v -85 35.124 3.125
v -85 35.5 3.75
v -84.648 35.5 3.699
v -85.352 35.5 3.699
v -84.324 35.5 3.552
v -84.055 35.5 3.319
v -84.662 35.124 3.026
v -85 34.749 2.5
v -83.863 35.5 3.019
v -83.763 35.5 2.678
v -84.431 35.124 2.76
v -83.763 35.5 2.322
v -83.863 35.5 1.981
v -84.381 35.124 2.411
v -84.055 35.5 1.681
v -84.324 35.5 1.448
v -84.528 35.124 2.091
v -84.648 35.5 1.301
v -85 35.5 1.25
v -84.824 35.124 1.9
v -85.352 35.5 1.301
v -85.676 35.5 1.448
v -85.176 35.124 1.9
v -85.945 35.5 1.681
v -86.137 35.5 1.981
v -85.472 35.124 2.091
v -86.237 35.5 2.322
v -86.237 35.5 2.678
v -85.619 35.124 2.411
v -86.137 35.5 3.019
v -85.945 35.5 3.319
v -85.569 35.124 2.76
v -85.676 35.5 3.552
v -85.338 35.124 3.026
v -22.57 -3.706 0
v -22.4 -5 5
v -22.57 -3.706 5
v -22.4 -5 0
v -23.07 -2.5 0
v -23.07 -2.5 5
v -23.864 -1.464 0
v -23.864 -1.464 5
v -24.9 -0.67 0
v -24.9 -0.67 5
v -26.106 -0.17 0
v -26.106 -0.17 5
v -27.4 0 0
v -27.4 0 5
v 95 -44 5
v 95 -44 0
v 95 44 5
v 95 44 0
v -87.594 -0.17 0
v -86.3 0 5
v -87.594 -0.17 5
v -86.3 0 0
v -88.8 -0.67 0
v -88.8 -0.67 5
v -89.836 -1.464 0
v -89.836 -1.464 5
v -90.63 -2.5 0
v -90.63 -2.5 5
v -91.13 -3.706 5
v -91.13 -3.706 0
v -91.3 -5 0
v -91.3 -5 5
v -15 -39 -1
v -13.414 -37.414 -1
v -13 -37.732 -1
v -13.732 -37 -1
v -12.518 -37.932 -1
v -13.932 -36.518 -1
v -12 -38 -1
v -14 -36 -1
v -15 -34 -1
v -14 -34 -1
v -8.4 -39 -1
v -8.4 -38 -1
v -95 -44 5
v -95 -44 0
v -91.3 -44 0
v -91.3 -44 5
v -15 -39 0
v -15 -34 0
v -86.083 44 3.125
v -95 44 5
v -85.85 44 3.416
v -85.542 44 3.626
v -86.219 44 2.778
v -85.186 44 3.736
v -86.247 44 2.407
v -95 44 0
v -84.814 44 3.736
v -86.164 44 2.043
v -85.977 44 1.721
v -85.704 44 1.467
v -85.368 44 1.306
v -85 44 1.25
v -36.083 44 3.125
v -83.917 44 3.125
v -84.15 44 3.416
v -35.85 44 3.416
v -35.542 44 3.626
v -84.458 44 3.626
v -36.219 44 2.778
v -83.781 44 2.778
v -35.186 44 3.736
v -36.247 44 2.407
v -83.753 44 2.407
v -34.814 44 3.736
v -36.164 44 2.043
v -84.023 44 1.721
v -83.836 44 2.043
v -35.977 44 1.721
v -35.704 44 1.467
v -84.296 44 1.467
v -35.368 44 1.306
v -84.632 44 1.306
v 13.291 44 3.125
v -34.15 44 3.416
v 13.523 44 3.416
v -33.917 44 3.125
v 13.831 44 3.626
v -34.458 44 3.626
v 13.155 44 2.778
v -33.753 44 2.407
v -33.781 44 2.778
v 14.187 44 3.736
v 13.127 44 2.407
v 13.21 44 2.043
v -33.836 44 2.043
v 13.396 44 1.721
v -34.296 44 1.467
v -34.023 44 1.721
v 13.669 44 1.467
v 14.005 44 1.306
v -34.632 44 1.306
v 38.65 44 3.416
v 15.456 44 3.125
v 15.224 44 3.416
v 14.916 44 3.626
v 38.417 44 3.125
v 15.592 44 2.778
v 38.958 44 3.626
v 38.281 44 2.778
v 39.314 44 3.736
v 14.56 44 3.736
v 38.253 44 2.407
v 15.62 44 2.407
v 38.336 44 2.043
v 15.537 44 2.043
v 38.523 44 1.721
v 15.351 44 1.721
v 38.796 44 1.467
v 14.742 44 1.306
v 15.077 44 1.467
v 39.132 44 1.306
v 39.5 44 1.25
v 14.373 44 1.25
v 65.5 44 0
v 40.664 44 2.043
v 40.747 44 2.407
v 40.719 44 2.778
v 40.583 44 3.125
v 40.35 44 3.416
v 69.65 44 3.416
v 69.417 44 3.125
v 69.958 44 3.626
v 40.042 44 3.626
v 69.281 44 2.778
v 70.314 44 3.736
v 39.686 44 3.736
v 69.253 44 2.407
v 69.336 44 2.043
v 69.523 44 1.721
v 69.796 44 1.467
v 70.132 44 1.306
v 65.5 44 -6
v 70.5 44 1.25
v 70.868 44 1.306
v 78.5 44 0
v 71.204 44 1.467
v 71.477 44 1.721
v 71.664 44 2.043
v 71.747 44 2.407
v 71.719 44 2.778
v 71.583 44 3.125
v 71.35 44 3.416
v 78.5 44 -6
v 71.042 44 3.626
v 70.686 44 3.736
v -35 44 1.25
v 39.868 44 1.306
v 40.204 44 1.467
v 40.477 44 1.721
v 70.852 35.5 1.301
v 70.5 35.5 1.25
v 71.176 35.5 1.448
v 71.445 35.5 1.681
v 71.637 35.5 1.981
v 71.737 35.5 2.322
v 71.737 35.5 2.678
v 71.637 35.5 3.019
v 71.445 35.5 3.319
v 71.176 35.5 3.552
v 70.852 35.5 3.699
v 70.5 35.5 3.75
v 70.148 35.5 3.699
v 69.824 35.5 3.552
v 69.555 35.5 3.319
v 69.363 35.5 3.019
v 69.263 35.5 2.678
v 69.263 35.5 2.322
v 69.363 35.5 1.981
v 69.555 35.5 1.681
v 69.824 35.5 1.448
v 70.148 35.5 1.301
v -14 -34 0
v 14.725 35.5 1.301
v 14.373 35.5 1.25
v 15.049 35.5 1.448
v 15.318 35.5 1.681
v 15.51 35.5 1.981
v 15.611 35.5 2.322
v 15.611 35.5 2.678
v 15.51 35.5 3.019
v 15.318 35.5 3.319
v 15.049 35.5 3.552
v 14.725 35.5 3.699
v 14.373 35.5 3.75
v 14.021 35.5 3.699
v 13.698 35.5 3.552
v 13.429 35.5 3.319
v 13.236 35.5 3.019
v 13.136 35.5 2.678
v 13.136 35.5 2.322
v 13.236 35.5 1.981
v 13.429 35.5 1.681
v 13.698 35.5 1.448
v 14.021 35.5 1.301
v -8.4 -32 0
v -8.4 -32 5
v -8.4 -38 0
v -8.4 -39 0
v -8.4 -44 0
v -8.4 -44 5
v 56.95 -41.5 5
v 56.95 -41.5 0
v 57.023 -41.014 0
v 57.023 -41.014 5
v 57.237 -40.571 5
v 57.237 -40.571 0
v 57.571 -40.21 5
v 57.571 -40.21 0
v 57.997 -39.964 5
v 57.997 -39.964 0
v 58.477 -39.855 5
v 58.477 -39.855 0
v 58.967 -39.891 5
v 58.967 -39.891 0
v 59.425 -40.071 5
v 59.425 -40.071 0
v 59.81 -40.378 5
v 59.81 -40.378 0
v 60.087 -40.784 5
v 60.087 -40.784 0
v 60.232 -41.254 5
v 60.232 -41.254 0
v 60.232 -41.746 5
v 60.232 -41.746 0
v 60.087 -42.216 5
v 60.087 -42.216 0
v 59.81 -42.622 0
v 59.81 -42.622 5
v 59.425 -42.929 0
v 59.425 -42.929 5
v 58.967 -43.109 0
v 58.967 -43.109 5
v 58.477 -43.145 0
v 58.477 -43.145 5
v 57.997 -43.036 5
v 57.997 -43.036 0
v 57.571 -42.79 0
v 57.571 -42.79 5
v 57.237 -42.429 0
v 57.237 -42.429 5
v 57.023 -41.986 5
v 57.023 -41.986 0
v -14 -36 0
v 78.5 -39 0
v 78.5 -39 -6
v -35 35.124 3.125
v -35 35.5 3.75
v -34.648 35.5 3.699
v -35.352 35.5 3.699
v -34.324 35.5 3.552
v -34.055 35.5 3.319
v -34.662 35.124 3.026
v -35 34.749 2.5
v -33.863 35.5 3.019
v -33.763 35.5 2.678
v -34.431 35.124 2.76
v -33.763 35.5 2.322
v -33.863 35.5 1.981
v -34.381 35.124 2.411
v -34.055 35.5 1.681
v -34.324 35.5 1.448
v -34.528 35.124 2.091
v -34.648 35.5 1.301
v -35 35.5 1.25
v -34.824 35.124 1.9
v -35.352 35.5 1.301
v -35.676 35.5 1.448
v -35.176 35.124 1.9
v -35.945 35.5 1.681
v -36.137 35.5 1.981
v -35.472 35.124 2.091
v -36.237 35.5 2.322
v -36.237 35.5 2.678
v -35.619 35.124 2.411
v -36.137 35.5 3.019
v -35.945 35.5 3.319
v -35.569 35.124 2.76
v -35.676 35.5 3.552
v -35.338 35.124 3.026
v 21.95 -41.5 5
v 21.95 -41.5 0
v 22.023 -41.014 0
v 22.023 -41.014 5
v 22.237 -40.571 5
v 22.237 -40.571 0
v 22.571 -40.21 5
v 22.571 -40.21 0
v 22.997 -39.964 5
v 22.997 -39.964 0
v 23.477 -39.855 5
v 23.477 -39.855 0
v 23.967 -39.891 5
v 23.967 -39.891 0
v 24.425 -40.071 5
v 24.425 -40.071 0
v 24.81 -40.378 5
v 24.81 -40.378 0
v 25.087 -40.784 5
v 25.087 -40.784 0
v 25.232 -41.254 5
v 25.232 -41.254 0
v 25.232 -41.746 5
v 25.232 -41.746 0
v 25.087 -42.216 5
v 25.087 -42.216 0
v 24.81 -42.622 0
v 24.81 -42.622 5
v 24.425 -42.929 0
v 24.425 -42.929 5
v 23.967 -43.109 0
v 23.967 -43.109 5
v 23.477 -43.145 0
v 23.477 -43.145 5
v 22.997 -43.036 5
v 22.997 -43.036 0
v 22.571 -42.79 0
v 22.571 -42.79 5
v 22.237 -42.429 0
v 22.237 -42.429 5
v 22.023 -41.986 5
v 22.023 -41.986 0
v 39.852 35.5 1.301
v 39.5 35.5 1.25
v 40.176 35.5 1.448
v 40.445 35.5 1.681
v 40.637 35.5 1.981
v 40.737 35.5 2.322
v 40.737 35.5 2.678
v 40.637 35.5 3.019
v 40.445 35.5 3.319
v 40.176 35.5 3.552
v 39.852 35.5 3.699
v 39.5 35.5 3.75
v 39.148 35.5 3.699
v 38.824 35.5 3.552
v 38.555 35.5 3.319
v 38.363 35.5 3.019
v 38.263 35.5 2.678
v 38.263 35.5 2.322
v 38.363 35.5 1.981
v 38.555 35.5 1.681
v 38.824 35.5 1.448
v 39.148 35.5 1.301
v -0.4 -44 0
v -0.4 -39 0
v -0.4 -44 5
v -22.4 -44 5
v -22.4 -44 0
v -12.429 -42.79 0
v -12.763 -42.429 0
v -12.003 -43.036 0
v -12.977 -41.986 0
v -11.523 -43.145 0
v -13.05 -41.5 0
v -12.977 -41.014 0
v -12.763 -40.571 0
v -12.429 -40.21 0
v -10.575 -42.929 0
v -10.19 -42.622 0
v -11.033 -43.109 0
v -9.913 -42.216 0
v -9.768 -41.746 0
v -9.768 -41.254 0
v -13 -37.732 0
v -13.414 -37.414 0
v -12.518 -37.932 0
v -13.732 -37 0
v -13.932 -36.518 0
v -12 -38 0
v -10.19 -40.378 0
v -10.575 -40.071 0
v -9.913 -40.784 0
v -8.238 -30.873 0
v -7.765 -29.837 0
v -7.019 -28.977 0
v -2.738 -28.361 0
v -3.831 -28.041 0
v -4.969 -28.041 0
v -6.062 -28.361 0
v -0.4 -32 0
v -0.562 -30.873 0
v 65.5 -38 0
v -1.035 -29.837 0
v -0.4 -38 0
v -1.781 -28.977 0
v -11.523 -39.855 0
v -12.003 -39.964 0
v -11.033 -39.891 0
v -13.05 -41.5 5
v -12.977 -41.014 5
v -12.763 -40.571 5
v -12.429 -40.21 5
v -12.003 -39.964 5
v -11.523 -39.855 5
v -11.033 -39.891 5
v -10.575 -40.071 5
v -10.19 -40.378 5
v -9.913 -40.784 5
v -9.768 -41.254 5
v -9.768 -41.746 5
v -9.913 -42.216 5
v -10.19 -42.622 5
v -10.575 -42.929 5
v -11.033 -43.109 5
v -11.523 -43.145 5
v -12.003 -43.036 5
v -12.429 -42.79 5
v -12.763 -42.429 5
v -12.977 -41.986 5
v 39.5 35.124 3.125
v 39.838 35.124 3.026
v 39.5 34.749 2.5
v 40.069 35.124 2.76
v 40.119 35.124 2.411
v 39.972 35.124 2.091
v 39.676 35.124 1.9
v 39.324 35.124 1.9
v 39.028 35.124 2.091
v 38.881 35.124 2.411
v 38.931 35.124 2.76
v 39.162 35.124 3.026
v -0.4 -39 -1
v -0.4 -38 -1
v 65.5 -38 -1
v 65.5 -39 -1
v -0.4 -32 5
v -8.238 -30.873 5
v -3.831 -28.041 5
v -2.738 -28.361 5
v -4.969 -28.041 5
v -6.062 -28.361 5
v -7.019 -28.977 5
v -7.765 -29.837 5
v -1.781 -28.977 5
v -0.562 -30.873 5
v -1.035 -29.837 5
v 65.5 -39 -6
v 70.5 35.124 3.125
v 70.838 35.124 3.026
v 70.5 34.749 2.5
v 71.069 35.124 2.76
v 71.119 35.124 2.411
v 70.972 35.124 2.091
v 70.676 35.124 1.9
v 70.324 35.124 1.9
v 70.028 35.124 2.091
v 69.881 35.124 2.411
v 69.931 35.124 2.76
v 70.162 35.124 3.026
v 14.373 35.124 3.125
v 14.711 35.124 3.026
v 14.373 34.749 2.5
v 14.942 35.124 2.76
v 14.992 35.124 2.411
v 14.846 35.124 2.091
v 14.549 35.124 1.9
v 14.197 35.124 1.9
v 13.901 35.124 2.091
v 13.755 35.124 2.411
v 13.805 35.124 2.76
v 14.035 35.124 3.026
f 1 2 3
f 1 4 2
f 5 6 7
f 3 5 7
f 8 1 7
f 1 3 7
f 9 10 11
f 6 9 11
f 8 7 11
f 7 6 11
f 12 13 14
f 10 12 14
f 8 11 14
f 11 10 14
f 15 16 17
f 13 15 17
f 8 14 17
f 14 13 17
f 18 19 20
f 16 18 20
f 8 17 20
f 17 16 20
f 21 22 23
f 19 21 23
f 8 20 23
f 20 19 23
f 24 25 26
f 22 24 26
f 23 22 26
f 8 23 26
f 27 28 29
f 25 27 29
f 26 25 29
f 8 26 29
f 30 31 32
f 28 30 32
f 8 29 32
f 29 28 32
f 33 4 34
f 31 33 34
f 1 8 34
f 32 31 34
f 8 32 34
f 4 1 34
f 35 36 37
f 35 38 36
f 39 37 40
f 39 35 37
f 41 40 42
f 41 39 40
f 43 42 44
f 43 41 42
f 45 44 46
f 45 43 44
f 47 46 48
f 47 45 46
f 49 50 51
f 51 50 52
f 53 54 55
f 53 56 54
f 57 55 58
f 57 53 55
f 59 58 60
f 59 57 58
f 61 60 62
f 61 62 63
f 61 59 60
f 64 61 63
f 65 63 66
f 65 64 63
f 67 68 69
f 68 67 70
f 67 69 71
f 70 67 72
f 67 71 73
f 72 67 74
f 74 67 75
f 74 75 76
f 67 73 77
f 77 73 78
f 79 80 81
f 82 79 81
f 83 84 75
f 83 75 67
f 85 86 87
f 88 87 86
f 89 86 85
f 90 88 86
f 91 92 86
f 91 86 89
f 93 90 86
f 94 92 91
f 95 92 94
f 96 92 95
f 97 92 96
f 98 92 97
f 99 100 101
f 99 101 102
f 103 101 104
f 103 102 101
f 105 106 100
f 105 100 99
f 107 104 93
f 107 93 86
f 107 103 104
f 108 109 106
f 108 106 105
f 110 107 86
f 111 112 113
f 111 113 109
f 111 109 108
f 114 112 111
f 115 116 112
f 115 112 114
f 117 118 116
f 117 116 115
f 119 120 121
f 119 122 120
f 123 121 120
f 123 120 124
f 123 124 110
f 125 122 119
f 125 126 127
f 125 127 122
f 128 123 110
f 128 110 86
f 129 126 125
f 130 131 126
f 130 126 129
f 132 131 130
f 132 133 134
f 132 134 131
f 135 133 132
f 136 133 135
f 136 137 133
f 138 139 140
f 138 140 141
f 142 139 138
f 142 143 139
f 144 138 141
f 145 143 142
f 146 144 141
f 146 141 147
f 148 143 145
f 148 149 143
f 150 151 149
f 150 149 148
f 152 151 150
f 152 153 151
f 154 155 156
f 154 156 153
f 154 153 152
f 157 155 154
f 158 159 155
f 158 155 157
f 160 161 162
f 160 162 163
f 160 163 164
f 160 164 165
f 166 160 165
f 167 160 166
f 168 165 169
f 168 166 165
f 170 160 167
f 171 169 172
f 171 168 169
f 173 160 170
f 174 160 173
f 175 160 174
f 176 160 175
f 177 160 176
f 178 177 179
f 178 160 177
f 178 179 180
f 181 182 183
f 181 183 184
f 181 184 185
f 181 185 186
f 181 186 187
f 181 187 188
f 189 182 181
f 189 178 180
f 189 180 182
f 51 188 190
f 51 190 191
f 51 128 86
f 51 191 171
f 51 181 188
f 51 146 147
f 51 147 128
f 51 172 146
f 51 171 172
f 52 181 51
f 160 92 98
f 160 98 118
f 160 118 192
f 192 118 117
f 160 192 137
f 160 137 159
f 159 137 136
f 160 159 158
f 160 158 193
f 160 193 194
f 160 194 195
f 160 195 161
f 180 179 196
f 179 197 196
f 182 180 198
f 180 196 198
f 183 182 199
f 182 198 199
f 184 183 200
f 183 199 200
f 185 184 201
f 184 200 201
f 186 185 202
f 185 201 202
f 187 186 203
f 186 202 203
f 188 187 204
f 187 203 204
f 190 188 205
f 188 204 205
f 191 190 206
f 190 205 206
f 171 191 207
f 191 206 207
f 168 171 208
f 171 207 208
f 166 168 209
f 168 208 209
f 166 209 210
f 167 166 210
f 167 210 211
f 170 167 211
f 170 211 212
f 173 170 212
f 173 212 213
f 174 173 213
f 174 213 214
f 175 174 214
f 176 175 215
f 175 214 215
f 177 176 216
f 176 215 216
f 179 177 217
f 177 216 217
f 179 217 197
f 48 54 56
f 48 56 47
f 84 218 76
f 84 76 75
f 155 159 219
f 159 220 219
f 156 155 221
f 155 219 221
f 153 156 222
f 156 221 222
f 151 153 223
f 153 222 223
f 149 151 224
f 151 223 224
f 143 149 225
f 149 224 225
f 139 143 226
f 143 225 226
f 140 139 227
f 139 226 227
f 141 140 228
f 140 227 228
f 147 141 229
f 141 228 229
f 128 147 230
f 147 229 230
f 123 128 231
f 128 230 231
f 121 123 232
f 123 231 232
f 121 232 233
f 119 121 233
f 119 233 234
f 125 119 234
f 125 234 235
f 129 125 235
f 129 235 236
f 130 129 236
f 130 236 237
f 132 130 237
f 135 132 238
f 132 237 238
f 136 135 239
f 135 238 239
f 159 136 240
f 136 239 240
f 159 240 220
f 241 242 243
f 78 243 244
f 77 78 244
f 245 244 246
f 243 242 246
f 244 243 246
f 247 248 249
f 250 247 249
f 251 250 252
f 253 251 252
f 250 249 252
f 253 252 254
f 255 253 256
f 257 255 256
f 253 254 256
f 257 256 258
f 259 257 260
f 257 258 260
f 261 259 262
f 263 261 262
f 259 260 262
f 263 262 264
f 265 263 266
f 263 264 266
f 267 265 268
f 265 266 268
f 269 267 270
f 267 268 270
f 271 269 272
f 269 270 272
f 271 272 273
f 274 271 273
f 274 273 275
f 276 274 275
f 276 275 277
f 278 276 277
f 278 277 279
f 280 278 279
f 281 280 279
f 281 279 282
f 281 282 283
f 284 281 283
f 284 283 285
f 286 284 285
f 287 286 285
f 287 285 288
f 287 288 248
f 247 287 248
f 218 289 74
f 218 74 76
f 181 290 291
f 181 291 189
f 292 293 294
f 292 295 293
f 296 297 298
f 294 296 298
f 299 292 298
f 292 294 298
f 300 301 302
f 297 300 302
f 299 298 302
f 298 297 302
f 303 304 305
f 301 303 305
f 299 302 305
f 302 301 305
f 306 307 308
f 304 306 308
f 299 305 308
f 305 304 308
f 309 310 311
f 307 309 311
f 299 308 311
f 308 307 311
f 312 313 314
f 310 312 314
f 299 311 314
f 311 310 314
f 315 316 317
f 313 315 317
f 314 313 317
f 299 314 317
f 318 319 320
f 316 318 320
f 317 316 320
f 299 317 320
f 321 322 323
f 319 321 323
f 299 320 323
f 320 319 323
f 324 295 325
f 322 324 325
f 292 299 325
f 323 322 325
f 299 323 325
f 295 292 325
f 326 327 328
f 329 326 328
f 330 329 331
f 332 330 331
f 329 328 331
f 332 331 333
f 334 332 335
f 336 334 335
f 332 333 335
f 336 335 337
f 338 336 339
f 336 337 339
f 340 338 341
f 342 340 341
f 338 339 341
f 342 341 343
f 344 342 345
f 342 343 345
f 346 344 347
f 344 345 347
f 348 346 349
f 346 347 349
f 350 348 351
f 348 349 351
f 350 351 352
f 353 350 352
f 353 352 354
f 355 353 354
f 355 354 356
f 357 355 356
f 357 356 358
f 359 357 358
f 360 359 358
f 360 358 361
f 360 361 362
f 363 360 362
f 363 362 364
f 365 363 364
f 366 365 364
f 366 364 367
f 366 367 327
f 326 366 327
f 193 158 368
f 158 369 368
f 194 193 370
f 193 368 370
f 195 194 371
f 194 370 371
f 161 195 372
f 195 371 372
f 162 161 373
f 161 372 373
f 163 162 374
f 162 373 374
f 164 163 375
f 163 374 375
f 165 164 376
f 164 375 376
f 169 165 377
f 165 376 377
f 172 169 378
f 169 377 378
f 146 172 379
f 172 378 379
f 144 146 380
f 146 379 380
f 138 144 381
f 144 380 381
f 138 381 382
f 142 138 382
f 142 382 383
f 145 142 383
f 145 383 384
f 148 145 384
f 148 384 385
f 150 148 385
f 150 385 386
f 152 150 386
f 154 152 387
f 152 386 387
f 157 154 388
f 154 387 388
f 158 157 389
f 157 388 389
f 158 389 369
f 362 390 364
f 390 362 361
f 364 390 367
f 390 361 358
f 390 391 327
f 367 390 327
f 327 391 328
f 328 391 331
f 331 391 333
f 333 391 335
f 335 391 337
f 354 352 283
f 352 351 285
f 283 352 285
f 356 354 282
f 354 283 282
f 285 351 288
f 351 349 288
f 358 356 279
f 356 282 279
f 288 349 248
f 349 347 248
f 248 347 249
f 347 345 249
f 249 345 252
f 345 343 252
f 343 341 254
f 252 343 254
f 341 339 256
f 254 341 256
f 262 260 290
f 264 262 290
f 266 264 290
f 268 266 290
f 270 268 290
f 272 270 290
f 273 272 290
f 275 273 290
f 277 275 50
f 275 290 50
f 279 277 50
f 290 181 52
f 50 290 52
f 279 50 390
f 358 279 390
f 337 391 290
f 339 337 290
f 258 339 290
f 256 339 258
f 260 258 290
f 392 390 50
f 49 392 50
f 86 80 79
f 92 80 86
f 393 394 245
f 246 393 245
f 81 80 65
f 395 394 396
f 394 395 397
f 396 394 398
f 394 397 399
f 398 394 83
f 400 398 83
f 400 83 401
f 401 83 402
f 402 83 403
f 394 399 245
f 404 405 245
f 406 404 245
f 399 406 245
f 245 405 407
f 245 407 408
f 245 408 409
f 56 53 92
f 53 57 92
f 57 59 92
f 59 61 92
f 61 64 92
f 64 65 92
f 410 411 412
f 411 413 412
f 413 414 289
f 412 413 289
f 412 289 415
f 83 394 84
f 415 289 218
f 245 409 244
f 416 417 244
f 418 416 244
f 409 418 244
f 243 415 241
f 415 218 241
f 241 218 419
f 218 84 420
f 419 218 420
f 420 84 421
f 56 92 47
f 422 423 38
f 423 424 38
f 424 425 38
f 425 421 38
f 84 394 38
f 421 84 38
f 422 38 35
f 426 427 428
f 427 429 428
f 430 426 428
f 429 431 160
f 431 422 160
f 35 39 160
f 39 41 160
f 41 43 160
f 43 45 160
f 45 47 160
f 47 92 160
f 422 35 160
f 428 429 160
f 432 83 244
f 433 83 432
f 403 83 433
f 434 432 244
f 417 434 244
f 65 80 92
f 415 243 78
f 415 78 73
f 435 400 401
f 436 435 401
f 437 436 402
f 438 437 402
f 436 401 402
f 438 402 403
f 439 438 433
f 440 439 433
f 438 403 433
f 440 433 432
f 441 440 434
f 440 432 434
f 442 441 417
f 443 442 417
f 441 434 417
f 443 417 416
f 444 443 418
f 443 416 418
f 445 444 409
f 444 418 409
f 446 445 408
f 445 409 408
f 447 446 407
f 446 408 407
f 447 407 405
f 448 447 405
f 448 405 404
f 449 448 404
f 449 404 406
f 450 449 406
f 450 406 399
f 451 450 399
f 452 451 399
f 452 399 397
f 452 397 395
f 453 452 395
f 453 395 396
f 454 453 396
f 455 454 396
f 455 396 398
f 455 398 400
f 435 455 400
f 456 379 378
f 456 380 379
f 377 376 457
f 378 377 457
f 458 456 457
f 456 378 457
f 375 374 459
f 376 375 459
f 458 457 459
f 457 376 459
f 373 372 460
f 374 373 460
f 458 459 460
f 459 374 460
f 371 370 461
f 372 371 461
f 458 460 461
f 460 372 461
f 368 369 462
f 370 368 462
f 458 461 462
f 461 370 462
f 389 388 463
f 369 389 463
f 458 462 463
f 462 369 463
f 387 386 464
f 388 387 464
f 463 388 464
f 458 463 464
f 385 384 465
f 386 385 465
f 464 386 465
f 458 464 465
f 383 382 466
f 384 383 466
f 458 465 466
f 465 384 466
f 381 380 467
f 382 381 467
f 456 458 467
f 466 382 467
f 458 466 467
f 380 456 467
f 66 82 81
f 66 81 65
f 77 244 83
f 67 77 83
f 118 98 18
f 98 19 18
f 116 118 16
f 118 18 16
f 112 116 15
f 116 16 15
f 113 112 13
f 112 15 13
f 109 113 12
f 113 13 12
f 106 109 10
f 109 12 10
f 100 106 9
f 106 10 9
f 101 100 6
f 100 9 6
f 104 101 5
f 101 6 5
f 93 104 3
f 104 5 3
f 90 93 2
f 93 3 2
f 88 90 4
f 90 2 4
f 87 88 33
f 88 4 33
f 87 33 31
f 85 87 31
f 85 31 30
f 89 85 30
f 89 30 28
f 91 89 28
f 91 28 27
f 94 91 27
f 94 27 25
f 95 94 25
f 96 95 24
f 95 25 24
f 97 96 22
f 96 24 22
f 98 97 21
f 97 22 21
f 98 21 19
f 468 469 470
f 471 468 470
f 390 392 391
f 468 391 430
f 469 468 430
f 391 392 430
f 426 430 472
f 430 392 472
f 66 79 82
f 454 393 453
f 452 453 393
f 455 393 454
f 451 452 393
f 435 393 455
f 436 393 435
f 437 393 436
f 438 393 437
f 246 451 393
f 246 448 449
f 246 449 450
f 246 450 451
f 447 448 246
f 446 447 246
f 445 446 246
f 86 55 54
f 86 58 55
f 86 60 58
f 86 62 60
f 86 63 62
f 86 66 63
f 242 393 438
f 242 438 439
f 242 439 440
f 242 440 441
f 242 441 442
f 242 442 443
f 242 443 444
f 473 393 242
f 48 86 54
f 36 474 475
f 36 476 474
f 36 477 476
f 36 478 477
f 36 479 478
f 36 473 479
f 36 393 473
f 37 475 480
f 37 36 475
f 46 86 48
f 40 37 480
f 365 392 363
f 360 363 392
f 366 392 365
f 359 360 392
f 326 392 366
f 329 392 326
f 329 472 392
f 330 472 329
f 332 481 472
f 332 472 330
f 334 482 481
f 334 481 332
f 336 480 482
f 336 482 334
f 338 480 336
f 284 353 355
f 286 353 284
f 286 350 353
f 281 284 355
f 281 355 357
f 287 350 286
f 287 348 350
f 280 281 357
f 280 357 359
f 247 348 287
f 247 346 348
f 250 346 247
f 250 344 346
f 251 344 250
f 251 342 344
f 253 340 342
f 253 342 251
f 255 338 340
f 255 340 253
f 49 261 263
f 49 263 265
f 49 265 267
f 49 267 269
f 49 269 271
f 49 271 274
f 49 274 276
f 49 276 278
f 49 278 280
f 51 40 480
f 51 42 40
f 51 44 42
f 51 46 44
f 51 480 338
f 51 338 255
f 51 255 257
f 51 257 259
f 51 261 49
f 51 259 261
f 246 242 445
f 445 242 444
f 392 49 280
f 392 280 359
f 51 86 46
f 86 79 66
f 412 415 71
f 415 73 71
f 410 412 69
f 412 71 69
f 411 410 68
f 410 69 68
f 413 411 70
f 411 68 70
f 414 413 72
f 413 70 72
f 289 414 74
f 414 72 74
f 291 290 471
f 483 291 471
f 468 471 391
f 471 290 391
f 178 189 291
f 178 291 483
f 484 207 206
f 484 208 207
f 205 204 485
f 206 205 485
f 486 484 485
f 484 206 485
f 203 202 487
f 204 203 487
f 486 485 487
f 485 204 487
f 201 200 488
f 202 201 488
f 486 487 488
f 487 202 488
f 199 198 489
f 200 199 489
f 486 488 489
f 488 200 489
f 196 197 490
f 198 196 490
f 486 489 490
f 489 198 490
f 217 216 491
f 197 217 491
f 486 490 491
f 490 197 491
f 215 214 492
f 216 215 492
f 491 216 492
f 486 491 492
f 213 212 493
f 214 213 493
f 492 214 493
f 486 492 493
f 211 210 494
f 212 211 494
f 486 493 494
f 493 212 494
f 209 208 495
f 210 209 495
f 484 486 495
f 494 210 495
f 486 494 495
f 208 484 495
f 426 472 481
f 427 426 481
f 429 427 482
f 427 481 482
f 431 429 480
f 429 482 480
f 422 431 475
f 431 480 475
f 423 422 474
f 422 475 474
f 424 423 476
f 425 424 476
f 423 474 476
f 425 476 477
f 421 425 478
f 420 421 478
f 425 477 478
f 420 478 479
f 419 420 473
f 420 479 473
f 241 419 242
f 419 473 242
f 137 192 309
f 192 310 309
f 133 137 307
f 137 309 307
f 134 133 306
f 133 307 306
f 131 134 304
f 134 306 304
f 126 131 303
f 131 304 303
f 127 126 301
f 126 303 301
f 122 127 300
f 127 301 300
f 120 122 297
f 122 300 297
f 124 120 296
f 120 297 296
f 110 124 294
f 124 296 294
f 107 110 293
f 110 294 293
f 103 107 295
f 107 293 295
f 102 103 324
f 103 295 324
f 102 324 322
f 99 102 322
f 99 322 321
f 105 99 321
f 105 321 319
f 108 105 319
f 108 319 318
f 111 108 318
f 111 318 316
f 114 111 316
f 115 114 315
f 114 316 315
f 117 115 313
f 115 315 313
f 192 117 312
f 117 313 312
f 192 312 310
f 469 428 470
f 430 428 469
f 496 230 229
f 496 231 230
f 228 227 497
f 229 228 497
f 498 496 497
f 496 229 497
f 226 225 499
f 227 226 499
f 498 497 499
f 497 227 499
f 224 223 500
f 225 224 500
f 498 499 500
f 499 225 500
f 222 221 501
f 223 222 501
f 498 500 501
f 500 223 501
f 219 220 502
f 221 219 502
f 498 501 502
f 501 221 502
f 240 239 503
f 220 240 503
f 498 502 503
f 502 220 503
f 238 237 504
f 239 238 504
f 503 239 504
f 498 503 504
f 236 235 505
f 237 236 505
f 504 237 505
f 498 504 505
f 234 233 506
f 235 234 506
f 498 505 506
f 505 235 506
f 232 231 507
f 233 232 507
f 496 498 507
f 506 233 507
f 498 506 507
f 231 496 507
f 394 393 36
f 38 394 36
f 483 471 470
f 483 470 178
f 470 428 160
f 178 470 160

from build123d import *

# Parameters (mm, degrees)
SKETCH1_W              = 190
SKETCH1_H              = 88
BOSS_EXTRUDE1_DEPTH    = 5
SKETCH2_W              = 13
SKETCH2_H              = 83
BOSS_EXTRUDE2_DEPTH    = 6
BOSS_EXTRUDE3_DEPTH    = 1
SKETCH7_R              = 1.65
CUT_EXTRUDE3_DEPTH     = 6
FILLET3_R              = 2
HOLE_WIZARD_M3_1_D     = 2.5
HOLE_WIZARD_M3_1_DEPTH = 8.5
HOLE_WIZARD_M3_1_TIP   = 0.751075774
CUT_EXTRUDE_START      = -5
CUT_EXTRUDE_1_DEPTH    = 12
SKETCH_4_W             = 68.9
SKETCH_4_H             = 44
CUT_EXTRUDE_2_DEPTH    = 12
FILLET_1_R             = 5


with BuildPart() as part:
    # Sketch1 → Boss-Extrude1 (new body)
    with BuildSketch(Plane.XY):
        Rectangle(SKETCH1_W, SKETCH1_H)
    extrude(amount=BOSS_EXTRUDE1_DEPTH)

    # Sketch2 → Boss-Extrude2 (add)
    with BuildSketch(Plane(origin=(0, 0, 0), x_dir=(-1, 0, 0), z_dir=(0, 0, -1))):
        with Locations((-72, 2.5)):
            Rectangle(SKETCH2_W, SKETCH2_H)
    extrude(amount=BOSS_EXTRUDE2_DEPTH)

    # Sketch4 → Boss-Extrude3 (add)
    with BuildSketch(Plane(origin=(0, 0, 0), x_dir=(-1, 0, 0), z_dir=(0, 0, -1))):
        Polygon((-65.5, -38), (14, -38), (14, -34), (15, -34), (15, -39), (-65.5, -39), align=None)
    extrude(amount=BOSS_EXTRUDE3_DEPTH)

    # Sketch7 → Cut-Extrude3 (cut, through all)
    with BuildSketch(Plane(origin=(0, 0, 0), x_dir=(-1, 0, 0), z_dir=(0, 0, -1))):
        with Locations((-58.6, -41.5)):
            Circle(SKETCH7_R)
        with Locations((-23.6, -41.5)):
            Circle(SKETCH7_R)
        with Locations((11.4, -41.5)):
            Circle(SKETCH7_R)
    extrude(amount=-CUT_EXTRUDE3_DEPTH, mode=Mode.SUBTRACT)

    # Fillet3
    fillet3_edges = [part.edges().sort_by_distance(p)[0] for p in [
        (-14, -38, -0.5),
    ]]
    fillet(fillet3_edges, radius=FILLET3_R)

    # M3 螺纹孔1
    with Locations(Plane(origin=(-85, 44, 2.5), x_dir=(0, 0, 1), z_dir=(0, 1, 0))):
        with Locations((0, 0), (0, 50), (0, 99.373308098), (0, 124.5), (0, 155.5)):
            Hole(HOLE_WIZARD_M3_1_D / 2, depth=HOLE_WIZARD_M3_1_DEPTH)
            with Locations((0, 0, -(HOLE_WIZARD_M3_1_DEPTH + HOLE_WIZARD_M3_1_TIP / 2))):  # 118° drill point
                Cone(0, HOLE_WIZARD_M3_1_D / 2, HOLE_WIZARD_M3_1_TIP, mode=Mode.SUBTRACT)

    # 草图3 → 切除-拉伸1 (cut, through all)
    with BuildSketch(Plane(origin=(0, 0, 0), x_dir=(-1, 0, 0), z_dir=(0, 0, -1)).offset(CUT_EXTRUDE_START)):
        with BuildLine():
            Line((0.4, -44), (0.4, -32))
            ThreePointArc((0.4, -32), (4.4, -28), (8.4, -32))
            Line((8.4, -32), (8.4, -44))
            Line((8.4, -44), (0.4, -44))
        make_face()
    extrude(amount=CUT_EXTRUDE_1_DEPTH, mode=Mode.SUBTRACT)

    # 草图4 → 切除-拉伸2 (cut, through all)
    with BuildSketch(Plane.XY.offset(5)):
        with Locations((-56.85, -22)):
            Rectangle(SKETCH_4_W, SKETCH_4_H)
    extrude(amount=-CUT_EXTRUDE_2_DEPTH, mode=Mode.SUBTRACT)

    # 圆角1
    fillet_1_edges = [part.edges().sort_by_distance(p)[0] for p in [
        (-91.3, 0, 2.5),
        (-22.4, 0, 2.5),
    ]]
    fillet(fillet_1_edges, radius=FILLET_1_R)


solid = part.part
